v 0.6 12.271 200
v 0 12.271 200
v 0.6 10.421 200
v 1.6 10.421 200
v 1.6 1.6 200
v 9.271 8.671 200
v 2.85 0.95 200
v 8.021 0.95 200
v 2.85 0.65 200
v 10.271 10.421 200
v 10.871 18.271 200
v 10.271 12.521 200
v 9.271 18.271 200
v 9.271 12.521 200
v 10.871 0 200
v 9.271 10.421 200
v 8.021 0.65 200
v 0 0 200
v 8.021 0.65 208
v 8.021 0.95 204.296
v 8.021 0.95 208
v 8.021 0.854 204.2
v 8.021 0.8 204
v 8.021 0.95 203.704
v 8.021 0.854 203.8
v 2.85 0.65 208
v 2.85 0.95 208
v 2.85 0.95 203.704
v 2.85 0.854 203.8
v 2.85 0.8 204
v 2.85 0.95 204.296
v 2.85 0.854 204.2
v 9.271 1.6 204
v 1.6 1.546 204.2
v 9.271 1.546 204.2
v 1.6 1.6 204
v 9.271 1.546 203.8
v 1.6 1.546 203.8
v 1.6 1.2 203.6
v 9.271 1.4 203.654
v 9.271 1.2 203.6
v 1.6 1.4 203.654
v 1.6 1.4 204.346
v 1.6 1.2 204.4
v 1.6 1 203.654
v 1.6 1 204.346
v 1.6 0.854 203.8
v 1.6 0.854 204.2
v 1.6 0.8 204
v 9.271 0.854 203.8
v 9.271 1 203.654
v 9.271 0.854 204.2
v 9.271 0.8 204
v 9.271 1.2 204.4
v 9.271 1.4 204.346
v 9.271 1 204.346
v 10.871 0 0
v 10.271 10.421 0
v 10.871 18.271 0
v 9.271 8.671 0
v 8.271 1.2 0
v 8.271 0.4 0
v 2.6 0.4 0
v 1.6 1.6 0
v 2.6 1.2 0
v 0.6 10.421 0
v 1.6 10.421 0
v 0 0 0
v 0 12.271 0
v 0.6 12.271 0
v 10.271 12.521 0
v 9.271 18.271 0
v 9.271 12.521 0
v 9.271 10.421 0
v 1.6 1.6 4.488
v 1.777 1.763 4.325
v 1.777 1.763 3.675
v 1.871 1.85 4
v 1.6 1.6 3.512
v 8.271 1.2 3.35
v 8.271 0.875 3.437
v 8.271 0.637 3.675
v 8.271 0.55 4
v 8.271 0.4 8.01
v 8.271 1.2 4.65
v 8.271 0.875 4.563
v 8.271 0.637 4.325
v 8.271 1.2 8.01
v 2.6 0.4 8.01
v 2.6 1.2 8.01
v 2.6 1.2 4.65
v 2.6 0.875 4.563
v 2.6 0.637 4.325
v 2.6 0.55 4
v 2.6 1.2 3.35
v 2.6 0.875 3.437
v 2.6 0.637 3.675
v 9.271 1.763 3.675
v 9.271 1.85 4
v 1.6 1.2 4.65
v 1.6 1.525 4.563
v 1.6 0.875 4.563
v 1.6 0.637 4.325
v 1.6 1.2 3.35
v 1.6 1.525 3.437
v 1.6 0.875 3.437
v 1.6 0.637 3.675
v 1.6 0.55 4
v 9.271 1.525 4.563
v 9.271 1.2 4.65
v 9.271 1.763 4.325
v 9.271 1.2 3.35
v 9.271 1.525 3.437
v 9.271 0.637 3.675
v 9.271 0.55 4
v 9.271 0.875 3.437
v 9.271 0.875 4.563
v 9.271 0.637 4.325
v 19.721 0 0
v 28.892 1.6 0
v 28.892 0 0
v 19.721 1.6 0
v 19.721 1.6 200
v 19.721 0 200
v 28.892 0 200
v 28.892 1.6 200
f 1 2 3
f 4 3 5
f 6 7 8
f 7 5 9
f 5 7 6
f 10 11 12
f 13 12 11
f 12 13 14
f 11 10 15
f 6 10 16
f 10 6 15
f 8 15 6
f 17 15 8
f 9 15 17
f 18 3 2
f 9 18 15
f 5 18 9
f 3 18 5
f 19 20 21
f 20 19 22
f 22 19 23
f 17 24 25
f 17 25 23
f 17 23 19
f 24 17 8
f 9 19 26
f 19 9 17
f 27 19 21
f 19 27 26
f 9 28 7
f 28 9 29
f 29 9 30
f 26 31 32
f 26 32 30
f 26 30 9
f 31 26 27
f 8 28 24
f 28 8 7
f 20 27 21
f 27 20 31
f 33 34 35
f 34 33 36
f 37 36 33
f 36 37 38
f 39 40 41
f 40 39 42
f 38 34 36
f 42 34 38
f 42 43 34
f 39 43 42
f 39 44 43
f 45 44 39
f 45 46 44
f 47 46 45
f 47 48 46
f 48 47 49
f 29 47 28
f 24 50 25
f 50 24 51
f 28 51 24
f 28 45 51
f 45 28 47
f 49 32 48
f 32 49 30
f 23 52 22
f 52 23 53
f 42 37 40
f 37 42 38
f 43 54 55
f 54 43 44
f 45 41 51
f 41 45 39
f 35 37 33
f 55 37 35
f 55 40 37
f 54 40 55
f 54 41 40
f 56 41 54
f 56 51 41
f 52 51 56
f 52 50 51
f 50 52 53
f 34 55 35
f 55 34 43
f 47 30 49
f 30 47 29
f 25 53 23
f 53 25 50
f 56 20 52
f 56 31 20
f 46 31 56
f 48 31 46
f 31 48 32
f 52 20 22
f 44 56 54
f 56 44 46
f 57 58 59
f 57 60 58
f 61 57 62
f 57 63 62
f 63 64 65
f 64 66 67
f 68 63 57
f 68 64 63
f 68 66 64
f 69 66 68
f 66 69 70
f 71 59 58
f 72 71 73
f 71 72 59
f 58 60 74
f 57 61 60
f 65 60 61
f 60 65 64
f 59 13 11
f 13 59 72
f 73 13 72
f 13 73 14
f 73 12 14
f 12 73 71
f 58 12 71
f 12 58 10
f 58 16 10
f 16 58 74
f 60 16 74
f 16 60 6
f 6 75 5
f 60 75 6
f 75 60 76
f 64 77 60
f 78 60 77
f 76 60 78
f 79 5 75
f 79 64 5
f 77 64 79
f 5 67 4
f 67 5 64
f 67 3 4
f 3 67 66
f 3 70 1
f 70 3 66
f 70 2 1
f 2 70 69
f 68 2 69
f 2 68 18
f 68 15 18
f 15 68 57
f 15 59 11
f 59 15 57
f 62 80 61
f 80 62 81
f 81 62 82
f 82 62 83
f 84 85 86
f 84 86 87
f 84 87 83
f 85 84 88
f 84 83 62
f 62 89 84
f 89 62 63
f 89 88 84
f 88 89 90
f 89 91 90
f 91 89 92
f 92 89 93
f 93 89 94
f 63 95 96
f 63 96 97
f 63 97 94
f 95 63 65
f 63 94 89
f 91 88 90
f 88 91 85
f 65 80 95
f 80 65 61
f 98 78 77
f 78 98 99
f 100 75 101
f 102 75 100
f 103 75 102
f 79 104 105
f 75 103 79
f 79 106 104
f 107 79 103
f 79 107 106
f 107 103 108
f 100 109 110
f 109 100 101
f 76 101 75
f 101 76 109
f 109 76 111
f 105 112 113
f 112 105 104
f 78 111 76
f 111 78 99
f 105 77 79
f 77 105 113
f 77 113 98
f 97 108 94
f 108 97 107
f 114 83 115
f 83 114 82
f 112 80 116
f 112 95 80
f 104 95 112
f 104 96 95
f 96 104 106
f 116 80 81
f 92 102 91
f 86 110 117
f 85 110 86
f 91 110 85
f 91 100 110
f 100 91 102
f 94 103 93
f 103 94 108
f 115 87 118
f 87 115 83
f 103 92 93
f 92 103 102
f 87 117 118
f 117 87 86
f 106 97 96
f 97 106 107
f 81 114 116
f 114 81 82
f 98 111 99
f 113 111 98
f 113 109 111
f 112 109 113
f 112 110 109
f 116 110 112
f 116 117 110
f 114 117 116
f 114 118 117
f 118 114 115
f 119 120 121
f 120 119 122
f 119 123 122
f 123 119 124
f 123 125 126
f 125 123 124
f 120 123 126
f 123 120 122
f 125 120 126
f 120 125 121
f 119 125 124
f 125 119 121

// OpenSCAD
// ============================================================
//  LED Profile Builder — canal simple, ruban incliné dedans
//  part = "seg" | "diff" | "both"
// ============================================================
// Un canal à FOND PLAT, qu'on colle sur une bordure : toute la semelle
// porte, rien ne bascule. C'est le RUBAN qui est incliné à l'intérieur,
// sur un plan en pente, et la joue haute lui sert de visière.
// Le mur est du côté -x, la volée du côté +x.

part = "both";

// --- Ruban --------------------------------------------------
strip_w = 10;    // largeur du ruban LED
angle   = 45;    // inclinaison du ruban : 0 = à plat, il éclaire droit
                 // vers le haut ; plus on monte, plus il vise le mur
strip_clr = 0.6; // jeu de pose du ruban dans le canal

// --- Profil -------------------------------------------------
wall_t  = 1.6;   // épaisseur des joues
base_t  = 1.6;   // épaisseur de la semelle
visor   = 6;     // ce dont la joue haute dépasse du diffuseur
head    = 2;     // garde entre le haut du ruban et le diffuseur

// --- Diffuseur ----------------------------------------------
diff_t    = 1.6; // épaisseur
diff_grip = 1.0; // profondeur des rainures
diff_clr  = 0.25;// jeu de glissement

// --- Segment et raccord -------------------------------------
seg_len  = 200;  // longueur d'un segment
join_len = 8;    // longueur du tenon ; 0 = bout à bout
join_clr = 0.25; // jeu du raccord

$fn = 32;

// ------------------------------------------------------------
// Cotes dérivées
// ------------------------------------------------------------
wi    = strip_w * cos(angle) + strip_clr;   // largeur intérieure
rise  = strip_w * sin(angle);               // dénivelé du ruban
bw    = wi + 2 * wall_t;                    // largeur hors tout
h_dif = base_t + rise + head;               // dessous du diffuseur
h_lo  = h_dif + diff_t;                     // joue côté mur
h_hi  = h_lo + visor;                       // joue côté volée : la visière

// ------------------------------------------------------------
// Section
// ------------------------------------------------------------
module section_2d() {
    difference() {
        union() {
            square([bw, h_lo]);                              // canal
            translate([bw - wall_t, 0]) square([wall_t, h_hi]); // visière
        }
        // creux : tout ce qui est au-dessus du plan incliné du ruban
        translate([wall_t, base_t])
            polygon([[0, 0], [wi, rise], [wi, h_hi], [0, h_hi]]);
        // rainures du diffuseur, dans les deux joues
        translate([wall_t - diff_grip, h_dif - diff_clr])
            square([diff_grip + 0.01, diff_t + 2 * diff_clr]);
        translate([bw - wall_t - 0.01, h_dif - diff_clr])
            square([diff_grip + 0.01, diff_t + 2 * diff_clr]);
    }
}

module diffuseur_2d() {
    translate([wall_t - diff_grip + diff_clr, 0])
        square([wi + 2 * (diff_grip - diff_clr), diff_t]);
}

// ------------------------------------------------------------
// Raccord : tenon dans la semelle, la seule partie pleine
// ------------------------------------------------------------
join_w = max(min(wi - 2, 14), 4);

module tenon_2d(jeu = 0) {
    offset(delta = -jeu)
        translate([bw / 2 - join_w / 2, 0.4]) square([join_w, base_t - 0.8]);
}
module cran(z, jeu = 0) {
    translate([bw / 2, base_t - 0.4, z])
        rotate([0, 90, 0])
            cylinder(r = 0.4 + jeu, h = join_w + 2, center = true, $fn = 12);
}

// ------------------------------------------------------------
// Segment
// ------------------------------------------------------------
module segment() {
    difference() {
        union() {
            linear_extrude(height = seg_len) section_2d();
            if (join_len > 0) {
                translate([0, 0, seg_len])
                    linear_extrude(height = join_len) tenon_2d(join_clr);
                cran(seg_len + join_len / 2);
            }
        }
        if (join_len > 0) {
            translate([0, 0, -0.01])
                linear_extrude(height = join_len + 0.02) tenon_2d();
            cran(join_len / 2, join_clr);
        }
    }
}

// ------------------------------------------------------------
// Sortie
// ------------------------------------------------------------
if (part == "seg")  segment();
if (part == "diff") linear_extrude(height = seg_len) diffuseur_2d();
if (part == "both") {
    segment();
    translate([bw + 8, 0, 0]) linear_extrude(height = seg_len) diffuseur_2d();
}
echo(str("largeur ", bw, " mm, hauteur ", h_hi, " mm"));
